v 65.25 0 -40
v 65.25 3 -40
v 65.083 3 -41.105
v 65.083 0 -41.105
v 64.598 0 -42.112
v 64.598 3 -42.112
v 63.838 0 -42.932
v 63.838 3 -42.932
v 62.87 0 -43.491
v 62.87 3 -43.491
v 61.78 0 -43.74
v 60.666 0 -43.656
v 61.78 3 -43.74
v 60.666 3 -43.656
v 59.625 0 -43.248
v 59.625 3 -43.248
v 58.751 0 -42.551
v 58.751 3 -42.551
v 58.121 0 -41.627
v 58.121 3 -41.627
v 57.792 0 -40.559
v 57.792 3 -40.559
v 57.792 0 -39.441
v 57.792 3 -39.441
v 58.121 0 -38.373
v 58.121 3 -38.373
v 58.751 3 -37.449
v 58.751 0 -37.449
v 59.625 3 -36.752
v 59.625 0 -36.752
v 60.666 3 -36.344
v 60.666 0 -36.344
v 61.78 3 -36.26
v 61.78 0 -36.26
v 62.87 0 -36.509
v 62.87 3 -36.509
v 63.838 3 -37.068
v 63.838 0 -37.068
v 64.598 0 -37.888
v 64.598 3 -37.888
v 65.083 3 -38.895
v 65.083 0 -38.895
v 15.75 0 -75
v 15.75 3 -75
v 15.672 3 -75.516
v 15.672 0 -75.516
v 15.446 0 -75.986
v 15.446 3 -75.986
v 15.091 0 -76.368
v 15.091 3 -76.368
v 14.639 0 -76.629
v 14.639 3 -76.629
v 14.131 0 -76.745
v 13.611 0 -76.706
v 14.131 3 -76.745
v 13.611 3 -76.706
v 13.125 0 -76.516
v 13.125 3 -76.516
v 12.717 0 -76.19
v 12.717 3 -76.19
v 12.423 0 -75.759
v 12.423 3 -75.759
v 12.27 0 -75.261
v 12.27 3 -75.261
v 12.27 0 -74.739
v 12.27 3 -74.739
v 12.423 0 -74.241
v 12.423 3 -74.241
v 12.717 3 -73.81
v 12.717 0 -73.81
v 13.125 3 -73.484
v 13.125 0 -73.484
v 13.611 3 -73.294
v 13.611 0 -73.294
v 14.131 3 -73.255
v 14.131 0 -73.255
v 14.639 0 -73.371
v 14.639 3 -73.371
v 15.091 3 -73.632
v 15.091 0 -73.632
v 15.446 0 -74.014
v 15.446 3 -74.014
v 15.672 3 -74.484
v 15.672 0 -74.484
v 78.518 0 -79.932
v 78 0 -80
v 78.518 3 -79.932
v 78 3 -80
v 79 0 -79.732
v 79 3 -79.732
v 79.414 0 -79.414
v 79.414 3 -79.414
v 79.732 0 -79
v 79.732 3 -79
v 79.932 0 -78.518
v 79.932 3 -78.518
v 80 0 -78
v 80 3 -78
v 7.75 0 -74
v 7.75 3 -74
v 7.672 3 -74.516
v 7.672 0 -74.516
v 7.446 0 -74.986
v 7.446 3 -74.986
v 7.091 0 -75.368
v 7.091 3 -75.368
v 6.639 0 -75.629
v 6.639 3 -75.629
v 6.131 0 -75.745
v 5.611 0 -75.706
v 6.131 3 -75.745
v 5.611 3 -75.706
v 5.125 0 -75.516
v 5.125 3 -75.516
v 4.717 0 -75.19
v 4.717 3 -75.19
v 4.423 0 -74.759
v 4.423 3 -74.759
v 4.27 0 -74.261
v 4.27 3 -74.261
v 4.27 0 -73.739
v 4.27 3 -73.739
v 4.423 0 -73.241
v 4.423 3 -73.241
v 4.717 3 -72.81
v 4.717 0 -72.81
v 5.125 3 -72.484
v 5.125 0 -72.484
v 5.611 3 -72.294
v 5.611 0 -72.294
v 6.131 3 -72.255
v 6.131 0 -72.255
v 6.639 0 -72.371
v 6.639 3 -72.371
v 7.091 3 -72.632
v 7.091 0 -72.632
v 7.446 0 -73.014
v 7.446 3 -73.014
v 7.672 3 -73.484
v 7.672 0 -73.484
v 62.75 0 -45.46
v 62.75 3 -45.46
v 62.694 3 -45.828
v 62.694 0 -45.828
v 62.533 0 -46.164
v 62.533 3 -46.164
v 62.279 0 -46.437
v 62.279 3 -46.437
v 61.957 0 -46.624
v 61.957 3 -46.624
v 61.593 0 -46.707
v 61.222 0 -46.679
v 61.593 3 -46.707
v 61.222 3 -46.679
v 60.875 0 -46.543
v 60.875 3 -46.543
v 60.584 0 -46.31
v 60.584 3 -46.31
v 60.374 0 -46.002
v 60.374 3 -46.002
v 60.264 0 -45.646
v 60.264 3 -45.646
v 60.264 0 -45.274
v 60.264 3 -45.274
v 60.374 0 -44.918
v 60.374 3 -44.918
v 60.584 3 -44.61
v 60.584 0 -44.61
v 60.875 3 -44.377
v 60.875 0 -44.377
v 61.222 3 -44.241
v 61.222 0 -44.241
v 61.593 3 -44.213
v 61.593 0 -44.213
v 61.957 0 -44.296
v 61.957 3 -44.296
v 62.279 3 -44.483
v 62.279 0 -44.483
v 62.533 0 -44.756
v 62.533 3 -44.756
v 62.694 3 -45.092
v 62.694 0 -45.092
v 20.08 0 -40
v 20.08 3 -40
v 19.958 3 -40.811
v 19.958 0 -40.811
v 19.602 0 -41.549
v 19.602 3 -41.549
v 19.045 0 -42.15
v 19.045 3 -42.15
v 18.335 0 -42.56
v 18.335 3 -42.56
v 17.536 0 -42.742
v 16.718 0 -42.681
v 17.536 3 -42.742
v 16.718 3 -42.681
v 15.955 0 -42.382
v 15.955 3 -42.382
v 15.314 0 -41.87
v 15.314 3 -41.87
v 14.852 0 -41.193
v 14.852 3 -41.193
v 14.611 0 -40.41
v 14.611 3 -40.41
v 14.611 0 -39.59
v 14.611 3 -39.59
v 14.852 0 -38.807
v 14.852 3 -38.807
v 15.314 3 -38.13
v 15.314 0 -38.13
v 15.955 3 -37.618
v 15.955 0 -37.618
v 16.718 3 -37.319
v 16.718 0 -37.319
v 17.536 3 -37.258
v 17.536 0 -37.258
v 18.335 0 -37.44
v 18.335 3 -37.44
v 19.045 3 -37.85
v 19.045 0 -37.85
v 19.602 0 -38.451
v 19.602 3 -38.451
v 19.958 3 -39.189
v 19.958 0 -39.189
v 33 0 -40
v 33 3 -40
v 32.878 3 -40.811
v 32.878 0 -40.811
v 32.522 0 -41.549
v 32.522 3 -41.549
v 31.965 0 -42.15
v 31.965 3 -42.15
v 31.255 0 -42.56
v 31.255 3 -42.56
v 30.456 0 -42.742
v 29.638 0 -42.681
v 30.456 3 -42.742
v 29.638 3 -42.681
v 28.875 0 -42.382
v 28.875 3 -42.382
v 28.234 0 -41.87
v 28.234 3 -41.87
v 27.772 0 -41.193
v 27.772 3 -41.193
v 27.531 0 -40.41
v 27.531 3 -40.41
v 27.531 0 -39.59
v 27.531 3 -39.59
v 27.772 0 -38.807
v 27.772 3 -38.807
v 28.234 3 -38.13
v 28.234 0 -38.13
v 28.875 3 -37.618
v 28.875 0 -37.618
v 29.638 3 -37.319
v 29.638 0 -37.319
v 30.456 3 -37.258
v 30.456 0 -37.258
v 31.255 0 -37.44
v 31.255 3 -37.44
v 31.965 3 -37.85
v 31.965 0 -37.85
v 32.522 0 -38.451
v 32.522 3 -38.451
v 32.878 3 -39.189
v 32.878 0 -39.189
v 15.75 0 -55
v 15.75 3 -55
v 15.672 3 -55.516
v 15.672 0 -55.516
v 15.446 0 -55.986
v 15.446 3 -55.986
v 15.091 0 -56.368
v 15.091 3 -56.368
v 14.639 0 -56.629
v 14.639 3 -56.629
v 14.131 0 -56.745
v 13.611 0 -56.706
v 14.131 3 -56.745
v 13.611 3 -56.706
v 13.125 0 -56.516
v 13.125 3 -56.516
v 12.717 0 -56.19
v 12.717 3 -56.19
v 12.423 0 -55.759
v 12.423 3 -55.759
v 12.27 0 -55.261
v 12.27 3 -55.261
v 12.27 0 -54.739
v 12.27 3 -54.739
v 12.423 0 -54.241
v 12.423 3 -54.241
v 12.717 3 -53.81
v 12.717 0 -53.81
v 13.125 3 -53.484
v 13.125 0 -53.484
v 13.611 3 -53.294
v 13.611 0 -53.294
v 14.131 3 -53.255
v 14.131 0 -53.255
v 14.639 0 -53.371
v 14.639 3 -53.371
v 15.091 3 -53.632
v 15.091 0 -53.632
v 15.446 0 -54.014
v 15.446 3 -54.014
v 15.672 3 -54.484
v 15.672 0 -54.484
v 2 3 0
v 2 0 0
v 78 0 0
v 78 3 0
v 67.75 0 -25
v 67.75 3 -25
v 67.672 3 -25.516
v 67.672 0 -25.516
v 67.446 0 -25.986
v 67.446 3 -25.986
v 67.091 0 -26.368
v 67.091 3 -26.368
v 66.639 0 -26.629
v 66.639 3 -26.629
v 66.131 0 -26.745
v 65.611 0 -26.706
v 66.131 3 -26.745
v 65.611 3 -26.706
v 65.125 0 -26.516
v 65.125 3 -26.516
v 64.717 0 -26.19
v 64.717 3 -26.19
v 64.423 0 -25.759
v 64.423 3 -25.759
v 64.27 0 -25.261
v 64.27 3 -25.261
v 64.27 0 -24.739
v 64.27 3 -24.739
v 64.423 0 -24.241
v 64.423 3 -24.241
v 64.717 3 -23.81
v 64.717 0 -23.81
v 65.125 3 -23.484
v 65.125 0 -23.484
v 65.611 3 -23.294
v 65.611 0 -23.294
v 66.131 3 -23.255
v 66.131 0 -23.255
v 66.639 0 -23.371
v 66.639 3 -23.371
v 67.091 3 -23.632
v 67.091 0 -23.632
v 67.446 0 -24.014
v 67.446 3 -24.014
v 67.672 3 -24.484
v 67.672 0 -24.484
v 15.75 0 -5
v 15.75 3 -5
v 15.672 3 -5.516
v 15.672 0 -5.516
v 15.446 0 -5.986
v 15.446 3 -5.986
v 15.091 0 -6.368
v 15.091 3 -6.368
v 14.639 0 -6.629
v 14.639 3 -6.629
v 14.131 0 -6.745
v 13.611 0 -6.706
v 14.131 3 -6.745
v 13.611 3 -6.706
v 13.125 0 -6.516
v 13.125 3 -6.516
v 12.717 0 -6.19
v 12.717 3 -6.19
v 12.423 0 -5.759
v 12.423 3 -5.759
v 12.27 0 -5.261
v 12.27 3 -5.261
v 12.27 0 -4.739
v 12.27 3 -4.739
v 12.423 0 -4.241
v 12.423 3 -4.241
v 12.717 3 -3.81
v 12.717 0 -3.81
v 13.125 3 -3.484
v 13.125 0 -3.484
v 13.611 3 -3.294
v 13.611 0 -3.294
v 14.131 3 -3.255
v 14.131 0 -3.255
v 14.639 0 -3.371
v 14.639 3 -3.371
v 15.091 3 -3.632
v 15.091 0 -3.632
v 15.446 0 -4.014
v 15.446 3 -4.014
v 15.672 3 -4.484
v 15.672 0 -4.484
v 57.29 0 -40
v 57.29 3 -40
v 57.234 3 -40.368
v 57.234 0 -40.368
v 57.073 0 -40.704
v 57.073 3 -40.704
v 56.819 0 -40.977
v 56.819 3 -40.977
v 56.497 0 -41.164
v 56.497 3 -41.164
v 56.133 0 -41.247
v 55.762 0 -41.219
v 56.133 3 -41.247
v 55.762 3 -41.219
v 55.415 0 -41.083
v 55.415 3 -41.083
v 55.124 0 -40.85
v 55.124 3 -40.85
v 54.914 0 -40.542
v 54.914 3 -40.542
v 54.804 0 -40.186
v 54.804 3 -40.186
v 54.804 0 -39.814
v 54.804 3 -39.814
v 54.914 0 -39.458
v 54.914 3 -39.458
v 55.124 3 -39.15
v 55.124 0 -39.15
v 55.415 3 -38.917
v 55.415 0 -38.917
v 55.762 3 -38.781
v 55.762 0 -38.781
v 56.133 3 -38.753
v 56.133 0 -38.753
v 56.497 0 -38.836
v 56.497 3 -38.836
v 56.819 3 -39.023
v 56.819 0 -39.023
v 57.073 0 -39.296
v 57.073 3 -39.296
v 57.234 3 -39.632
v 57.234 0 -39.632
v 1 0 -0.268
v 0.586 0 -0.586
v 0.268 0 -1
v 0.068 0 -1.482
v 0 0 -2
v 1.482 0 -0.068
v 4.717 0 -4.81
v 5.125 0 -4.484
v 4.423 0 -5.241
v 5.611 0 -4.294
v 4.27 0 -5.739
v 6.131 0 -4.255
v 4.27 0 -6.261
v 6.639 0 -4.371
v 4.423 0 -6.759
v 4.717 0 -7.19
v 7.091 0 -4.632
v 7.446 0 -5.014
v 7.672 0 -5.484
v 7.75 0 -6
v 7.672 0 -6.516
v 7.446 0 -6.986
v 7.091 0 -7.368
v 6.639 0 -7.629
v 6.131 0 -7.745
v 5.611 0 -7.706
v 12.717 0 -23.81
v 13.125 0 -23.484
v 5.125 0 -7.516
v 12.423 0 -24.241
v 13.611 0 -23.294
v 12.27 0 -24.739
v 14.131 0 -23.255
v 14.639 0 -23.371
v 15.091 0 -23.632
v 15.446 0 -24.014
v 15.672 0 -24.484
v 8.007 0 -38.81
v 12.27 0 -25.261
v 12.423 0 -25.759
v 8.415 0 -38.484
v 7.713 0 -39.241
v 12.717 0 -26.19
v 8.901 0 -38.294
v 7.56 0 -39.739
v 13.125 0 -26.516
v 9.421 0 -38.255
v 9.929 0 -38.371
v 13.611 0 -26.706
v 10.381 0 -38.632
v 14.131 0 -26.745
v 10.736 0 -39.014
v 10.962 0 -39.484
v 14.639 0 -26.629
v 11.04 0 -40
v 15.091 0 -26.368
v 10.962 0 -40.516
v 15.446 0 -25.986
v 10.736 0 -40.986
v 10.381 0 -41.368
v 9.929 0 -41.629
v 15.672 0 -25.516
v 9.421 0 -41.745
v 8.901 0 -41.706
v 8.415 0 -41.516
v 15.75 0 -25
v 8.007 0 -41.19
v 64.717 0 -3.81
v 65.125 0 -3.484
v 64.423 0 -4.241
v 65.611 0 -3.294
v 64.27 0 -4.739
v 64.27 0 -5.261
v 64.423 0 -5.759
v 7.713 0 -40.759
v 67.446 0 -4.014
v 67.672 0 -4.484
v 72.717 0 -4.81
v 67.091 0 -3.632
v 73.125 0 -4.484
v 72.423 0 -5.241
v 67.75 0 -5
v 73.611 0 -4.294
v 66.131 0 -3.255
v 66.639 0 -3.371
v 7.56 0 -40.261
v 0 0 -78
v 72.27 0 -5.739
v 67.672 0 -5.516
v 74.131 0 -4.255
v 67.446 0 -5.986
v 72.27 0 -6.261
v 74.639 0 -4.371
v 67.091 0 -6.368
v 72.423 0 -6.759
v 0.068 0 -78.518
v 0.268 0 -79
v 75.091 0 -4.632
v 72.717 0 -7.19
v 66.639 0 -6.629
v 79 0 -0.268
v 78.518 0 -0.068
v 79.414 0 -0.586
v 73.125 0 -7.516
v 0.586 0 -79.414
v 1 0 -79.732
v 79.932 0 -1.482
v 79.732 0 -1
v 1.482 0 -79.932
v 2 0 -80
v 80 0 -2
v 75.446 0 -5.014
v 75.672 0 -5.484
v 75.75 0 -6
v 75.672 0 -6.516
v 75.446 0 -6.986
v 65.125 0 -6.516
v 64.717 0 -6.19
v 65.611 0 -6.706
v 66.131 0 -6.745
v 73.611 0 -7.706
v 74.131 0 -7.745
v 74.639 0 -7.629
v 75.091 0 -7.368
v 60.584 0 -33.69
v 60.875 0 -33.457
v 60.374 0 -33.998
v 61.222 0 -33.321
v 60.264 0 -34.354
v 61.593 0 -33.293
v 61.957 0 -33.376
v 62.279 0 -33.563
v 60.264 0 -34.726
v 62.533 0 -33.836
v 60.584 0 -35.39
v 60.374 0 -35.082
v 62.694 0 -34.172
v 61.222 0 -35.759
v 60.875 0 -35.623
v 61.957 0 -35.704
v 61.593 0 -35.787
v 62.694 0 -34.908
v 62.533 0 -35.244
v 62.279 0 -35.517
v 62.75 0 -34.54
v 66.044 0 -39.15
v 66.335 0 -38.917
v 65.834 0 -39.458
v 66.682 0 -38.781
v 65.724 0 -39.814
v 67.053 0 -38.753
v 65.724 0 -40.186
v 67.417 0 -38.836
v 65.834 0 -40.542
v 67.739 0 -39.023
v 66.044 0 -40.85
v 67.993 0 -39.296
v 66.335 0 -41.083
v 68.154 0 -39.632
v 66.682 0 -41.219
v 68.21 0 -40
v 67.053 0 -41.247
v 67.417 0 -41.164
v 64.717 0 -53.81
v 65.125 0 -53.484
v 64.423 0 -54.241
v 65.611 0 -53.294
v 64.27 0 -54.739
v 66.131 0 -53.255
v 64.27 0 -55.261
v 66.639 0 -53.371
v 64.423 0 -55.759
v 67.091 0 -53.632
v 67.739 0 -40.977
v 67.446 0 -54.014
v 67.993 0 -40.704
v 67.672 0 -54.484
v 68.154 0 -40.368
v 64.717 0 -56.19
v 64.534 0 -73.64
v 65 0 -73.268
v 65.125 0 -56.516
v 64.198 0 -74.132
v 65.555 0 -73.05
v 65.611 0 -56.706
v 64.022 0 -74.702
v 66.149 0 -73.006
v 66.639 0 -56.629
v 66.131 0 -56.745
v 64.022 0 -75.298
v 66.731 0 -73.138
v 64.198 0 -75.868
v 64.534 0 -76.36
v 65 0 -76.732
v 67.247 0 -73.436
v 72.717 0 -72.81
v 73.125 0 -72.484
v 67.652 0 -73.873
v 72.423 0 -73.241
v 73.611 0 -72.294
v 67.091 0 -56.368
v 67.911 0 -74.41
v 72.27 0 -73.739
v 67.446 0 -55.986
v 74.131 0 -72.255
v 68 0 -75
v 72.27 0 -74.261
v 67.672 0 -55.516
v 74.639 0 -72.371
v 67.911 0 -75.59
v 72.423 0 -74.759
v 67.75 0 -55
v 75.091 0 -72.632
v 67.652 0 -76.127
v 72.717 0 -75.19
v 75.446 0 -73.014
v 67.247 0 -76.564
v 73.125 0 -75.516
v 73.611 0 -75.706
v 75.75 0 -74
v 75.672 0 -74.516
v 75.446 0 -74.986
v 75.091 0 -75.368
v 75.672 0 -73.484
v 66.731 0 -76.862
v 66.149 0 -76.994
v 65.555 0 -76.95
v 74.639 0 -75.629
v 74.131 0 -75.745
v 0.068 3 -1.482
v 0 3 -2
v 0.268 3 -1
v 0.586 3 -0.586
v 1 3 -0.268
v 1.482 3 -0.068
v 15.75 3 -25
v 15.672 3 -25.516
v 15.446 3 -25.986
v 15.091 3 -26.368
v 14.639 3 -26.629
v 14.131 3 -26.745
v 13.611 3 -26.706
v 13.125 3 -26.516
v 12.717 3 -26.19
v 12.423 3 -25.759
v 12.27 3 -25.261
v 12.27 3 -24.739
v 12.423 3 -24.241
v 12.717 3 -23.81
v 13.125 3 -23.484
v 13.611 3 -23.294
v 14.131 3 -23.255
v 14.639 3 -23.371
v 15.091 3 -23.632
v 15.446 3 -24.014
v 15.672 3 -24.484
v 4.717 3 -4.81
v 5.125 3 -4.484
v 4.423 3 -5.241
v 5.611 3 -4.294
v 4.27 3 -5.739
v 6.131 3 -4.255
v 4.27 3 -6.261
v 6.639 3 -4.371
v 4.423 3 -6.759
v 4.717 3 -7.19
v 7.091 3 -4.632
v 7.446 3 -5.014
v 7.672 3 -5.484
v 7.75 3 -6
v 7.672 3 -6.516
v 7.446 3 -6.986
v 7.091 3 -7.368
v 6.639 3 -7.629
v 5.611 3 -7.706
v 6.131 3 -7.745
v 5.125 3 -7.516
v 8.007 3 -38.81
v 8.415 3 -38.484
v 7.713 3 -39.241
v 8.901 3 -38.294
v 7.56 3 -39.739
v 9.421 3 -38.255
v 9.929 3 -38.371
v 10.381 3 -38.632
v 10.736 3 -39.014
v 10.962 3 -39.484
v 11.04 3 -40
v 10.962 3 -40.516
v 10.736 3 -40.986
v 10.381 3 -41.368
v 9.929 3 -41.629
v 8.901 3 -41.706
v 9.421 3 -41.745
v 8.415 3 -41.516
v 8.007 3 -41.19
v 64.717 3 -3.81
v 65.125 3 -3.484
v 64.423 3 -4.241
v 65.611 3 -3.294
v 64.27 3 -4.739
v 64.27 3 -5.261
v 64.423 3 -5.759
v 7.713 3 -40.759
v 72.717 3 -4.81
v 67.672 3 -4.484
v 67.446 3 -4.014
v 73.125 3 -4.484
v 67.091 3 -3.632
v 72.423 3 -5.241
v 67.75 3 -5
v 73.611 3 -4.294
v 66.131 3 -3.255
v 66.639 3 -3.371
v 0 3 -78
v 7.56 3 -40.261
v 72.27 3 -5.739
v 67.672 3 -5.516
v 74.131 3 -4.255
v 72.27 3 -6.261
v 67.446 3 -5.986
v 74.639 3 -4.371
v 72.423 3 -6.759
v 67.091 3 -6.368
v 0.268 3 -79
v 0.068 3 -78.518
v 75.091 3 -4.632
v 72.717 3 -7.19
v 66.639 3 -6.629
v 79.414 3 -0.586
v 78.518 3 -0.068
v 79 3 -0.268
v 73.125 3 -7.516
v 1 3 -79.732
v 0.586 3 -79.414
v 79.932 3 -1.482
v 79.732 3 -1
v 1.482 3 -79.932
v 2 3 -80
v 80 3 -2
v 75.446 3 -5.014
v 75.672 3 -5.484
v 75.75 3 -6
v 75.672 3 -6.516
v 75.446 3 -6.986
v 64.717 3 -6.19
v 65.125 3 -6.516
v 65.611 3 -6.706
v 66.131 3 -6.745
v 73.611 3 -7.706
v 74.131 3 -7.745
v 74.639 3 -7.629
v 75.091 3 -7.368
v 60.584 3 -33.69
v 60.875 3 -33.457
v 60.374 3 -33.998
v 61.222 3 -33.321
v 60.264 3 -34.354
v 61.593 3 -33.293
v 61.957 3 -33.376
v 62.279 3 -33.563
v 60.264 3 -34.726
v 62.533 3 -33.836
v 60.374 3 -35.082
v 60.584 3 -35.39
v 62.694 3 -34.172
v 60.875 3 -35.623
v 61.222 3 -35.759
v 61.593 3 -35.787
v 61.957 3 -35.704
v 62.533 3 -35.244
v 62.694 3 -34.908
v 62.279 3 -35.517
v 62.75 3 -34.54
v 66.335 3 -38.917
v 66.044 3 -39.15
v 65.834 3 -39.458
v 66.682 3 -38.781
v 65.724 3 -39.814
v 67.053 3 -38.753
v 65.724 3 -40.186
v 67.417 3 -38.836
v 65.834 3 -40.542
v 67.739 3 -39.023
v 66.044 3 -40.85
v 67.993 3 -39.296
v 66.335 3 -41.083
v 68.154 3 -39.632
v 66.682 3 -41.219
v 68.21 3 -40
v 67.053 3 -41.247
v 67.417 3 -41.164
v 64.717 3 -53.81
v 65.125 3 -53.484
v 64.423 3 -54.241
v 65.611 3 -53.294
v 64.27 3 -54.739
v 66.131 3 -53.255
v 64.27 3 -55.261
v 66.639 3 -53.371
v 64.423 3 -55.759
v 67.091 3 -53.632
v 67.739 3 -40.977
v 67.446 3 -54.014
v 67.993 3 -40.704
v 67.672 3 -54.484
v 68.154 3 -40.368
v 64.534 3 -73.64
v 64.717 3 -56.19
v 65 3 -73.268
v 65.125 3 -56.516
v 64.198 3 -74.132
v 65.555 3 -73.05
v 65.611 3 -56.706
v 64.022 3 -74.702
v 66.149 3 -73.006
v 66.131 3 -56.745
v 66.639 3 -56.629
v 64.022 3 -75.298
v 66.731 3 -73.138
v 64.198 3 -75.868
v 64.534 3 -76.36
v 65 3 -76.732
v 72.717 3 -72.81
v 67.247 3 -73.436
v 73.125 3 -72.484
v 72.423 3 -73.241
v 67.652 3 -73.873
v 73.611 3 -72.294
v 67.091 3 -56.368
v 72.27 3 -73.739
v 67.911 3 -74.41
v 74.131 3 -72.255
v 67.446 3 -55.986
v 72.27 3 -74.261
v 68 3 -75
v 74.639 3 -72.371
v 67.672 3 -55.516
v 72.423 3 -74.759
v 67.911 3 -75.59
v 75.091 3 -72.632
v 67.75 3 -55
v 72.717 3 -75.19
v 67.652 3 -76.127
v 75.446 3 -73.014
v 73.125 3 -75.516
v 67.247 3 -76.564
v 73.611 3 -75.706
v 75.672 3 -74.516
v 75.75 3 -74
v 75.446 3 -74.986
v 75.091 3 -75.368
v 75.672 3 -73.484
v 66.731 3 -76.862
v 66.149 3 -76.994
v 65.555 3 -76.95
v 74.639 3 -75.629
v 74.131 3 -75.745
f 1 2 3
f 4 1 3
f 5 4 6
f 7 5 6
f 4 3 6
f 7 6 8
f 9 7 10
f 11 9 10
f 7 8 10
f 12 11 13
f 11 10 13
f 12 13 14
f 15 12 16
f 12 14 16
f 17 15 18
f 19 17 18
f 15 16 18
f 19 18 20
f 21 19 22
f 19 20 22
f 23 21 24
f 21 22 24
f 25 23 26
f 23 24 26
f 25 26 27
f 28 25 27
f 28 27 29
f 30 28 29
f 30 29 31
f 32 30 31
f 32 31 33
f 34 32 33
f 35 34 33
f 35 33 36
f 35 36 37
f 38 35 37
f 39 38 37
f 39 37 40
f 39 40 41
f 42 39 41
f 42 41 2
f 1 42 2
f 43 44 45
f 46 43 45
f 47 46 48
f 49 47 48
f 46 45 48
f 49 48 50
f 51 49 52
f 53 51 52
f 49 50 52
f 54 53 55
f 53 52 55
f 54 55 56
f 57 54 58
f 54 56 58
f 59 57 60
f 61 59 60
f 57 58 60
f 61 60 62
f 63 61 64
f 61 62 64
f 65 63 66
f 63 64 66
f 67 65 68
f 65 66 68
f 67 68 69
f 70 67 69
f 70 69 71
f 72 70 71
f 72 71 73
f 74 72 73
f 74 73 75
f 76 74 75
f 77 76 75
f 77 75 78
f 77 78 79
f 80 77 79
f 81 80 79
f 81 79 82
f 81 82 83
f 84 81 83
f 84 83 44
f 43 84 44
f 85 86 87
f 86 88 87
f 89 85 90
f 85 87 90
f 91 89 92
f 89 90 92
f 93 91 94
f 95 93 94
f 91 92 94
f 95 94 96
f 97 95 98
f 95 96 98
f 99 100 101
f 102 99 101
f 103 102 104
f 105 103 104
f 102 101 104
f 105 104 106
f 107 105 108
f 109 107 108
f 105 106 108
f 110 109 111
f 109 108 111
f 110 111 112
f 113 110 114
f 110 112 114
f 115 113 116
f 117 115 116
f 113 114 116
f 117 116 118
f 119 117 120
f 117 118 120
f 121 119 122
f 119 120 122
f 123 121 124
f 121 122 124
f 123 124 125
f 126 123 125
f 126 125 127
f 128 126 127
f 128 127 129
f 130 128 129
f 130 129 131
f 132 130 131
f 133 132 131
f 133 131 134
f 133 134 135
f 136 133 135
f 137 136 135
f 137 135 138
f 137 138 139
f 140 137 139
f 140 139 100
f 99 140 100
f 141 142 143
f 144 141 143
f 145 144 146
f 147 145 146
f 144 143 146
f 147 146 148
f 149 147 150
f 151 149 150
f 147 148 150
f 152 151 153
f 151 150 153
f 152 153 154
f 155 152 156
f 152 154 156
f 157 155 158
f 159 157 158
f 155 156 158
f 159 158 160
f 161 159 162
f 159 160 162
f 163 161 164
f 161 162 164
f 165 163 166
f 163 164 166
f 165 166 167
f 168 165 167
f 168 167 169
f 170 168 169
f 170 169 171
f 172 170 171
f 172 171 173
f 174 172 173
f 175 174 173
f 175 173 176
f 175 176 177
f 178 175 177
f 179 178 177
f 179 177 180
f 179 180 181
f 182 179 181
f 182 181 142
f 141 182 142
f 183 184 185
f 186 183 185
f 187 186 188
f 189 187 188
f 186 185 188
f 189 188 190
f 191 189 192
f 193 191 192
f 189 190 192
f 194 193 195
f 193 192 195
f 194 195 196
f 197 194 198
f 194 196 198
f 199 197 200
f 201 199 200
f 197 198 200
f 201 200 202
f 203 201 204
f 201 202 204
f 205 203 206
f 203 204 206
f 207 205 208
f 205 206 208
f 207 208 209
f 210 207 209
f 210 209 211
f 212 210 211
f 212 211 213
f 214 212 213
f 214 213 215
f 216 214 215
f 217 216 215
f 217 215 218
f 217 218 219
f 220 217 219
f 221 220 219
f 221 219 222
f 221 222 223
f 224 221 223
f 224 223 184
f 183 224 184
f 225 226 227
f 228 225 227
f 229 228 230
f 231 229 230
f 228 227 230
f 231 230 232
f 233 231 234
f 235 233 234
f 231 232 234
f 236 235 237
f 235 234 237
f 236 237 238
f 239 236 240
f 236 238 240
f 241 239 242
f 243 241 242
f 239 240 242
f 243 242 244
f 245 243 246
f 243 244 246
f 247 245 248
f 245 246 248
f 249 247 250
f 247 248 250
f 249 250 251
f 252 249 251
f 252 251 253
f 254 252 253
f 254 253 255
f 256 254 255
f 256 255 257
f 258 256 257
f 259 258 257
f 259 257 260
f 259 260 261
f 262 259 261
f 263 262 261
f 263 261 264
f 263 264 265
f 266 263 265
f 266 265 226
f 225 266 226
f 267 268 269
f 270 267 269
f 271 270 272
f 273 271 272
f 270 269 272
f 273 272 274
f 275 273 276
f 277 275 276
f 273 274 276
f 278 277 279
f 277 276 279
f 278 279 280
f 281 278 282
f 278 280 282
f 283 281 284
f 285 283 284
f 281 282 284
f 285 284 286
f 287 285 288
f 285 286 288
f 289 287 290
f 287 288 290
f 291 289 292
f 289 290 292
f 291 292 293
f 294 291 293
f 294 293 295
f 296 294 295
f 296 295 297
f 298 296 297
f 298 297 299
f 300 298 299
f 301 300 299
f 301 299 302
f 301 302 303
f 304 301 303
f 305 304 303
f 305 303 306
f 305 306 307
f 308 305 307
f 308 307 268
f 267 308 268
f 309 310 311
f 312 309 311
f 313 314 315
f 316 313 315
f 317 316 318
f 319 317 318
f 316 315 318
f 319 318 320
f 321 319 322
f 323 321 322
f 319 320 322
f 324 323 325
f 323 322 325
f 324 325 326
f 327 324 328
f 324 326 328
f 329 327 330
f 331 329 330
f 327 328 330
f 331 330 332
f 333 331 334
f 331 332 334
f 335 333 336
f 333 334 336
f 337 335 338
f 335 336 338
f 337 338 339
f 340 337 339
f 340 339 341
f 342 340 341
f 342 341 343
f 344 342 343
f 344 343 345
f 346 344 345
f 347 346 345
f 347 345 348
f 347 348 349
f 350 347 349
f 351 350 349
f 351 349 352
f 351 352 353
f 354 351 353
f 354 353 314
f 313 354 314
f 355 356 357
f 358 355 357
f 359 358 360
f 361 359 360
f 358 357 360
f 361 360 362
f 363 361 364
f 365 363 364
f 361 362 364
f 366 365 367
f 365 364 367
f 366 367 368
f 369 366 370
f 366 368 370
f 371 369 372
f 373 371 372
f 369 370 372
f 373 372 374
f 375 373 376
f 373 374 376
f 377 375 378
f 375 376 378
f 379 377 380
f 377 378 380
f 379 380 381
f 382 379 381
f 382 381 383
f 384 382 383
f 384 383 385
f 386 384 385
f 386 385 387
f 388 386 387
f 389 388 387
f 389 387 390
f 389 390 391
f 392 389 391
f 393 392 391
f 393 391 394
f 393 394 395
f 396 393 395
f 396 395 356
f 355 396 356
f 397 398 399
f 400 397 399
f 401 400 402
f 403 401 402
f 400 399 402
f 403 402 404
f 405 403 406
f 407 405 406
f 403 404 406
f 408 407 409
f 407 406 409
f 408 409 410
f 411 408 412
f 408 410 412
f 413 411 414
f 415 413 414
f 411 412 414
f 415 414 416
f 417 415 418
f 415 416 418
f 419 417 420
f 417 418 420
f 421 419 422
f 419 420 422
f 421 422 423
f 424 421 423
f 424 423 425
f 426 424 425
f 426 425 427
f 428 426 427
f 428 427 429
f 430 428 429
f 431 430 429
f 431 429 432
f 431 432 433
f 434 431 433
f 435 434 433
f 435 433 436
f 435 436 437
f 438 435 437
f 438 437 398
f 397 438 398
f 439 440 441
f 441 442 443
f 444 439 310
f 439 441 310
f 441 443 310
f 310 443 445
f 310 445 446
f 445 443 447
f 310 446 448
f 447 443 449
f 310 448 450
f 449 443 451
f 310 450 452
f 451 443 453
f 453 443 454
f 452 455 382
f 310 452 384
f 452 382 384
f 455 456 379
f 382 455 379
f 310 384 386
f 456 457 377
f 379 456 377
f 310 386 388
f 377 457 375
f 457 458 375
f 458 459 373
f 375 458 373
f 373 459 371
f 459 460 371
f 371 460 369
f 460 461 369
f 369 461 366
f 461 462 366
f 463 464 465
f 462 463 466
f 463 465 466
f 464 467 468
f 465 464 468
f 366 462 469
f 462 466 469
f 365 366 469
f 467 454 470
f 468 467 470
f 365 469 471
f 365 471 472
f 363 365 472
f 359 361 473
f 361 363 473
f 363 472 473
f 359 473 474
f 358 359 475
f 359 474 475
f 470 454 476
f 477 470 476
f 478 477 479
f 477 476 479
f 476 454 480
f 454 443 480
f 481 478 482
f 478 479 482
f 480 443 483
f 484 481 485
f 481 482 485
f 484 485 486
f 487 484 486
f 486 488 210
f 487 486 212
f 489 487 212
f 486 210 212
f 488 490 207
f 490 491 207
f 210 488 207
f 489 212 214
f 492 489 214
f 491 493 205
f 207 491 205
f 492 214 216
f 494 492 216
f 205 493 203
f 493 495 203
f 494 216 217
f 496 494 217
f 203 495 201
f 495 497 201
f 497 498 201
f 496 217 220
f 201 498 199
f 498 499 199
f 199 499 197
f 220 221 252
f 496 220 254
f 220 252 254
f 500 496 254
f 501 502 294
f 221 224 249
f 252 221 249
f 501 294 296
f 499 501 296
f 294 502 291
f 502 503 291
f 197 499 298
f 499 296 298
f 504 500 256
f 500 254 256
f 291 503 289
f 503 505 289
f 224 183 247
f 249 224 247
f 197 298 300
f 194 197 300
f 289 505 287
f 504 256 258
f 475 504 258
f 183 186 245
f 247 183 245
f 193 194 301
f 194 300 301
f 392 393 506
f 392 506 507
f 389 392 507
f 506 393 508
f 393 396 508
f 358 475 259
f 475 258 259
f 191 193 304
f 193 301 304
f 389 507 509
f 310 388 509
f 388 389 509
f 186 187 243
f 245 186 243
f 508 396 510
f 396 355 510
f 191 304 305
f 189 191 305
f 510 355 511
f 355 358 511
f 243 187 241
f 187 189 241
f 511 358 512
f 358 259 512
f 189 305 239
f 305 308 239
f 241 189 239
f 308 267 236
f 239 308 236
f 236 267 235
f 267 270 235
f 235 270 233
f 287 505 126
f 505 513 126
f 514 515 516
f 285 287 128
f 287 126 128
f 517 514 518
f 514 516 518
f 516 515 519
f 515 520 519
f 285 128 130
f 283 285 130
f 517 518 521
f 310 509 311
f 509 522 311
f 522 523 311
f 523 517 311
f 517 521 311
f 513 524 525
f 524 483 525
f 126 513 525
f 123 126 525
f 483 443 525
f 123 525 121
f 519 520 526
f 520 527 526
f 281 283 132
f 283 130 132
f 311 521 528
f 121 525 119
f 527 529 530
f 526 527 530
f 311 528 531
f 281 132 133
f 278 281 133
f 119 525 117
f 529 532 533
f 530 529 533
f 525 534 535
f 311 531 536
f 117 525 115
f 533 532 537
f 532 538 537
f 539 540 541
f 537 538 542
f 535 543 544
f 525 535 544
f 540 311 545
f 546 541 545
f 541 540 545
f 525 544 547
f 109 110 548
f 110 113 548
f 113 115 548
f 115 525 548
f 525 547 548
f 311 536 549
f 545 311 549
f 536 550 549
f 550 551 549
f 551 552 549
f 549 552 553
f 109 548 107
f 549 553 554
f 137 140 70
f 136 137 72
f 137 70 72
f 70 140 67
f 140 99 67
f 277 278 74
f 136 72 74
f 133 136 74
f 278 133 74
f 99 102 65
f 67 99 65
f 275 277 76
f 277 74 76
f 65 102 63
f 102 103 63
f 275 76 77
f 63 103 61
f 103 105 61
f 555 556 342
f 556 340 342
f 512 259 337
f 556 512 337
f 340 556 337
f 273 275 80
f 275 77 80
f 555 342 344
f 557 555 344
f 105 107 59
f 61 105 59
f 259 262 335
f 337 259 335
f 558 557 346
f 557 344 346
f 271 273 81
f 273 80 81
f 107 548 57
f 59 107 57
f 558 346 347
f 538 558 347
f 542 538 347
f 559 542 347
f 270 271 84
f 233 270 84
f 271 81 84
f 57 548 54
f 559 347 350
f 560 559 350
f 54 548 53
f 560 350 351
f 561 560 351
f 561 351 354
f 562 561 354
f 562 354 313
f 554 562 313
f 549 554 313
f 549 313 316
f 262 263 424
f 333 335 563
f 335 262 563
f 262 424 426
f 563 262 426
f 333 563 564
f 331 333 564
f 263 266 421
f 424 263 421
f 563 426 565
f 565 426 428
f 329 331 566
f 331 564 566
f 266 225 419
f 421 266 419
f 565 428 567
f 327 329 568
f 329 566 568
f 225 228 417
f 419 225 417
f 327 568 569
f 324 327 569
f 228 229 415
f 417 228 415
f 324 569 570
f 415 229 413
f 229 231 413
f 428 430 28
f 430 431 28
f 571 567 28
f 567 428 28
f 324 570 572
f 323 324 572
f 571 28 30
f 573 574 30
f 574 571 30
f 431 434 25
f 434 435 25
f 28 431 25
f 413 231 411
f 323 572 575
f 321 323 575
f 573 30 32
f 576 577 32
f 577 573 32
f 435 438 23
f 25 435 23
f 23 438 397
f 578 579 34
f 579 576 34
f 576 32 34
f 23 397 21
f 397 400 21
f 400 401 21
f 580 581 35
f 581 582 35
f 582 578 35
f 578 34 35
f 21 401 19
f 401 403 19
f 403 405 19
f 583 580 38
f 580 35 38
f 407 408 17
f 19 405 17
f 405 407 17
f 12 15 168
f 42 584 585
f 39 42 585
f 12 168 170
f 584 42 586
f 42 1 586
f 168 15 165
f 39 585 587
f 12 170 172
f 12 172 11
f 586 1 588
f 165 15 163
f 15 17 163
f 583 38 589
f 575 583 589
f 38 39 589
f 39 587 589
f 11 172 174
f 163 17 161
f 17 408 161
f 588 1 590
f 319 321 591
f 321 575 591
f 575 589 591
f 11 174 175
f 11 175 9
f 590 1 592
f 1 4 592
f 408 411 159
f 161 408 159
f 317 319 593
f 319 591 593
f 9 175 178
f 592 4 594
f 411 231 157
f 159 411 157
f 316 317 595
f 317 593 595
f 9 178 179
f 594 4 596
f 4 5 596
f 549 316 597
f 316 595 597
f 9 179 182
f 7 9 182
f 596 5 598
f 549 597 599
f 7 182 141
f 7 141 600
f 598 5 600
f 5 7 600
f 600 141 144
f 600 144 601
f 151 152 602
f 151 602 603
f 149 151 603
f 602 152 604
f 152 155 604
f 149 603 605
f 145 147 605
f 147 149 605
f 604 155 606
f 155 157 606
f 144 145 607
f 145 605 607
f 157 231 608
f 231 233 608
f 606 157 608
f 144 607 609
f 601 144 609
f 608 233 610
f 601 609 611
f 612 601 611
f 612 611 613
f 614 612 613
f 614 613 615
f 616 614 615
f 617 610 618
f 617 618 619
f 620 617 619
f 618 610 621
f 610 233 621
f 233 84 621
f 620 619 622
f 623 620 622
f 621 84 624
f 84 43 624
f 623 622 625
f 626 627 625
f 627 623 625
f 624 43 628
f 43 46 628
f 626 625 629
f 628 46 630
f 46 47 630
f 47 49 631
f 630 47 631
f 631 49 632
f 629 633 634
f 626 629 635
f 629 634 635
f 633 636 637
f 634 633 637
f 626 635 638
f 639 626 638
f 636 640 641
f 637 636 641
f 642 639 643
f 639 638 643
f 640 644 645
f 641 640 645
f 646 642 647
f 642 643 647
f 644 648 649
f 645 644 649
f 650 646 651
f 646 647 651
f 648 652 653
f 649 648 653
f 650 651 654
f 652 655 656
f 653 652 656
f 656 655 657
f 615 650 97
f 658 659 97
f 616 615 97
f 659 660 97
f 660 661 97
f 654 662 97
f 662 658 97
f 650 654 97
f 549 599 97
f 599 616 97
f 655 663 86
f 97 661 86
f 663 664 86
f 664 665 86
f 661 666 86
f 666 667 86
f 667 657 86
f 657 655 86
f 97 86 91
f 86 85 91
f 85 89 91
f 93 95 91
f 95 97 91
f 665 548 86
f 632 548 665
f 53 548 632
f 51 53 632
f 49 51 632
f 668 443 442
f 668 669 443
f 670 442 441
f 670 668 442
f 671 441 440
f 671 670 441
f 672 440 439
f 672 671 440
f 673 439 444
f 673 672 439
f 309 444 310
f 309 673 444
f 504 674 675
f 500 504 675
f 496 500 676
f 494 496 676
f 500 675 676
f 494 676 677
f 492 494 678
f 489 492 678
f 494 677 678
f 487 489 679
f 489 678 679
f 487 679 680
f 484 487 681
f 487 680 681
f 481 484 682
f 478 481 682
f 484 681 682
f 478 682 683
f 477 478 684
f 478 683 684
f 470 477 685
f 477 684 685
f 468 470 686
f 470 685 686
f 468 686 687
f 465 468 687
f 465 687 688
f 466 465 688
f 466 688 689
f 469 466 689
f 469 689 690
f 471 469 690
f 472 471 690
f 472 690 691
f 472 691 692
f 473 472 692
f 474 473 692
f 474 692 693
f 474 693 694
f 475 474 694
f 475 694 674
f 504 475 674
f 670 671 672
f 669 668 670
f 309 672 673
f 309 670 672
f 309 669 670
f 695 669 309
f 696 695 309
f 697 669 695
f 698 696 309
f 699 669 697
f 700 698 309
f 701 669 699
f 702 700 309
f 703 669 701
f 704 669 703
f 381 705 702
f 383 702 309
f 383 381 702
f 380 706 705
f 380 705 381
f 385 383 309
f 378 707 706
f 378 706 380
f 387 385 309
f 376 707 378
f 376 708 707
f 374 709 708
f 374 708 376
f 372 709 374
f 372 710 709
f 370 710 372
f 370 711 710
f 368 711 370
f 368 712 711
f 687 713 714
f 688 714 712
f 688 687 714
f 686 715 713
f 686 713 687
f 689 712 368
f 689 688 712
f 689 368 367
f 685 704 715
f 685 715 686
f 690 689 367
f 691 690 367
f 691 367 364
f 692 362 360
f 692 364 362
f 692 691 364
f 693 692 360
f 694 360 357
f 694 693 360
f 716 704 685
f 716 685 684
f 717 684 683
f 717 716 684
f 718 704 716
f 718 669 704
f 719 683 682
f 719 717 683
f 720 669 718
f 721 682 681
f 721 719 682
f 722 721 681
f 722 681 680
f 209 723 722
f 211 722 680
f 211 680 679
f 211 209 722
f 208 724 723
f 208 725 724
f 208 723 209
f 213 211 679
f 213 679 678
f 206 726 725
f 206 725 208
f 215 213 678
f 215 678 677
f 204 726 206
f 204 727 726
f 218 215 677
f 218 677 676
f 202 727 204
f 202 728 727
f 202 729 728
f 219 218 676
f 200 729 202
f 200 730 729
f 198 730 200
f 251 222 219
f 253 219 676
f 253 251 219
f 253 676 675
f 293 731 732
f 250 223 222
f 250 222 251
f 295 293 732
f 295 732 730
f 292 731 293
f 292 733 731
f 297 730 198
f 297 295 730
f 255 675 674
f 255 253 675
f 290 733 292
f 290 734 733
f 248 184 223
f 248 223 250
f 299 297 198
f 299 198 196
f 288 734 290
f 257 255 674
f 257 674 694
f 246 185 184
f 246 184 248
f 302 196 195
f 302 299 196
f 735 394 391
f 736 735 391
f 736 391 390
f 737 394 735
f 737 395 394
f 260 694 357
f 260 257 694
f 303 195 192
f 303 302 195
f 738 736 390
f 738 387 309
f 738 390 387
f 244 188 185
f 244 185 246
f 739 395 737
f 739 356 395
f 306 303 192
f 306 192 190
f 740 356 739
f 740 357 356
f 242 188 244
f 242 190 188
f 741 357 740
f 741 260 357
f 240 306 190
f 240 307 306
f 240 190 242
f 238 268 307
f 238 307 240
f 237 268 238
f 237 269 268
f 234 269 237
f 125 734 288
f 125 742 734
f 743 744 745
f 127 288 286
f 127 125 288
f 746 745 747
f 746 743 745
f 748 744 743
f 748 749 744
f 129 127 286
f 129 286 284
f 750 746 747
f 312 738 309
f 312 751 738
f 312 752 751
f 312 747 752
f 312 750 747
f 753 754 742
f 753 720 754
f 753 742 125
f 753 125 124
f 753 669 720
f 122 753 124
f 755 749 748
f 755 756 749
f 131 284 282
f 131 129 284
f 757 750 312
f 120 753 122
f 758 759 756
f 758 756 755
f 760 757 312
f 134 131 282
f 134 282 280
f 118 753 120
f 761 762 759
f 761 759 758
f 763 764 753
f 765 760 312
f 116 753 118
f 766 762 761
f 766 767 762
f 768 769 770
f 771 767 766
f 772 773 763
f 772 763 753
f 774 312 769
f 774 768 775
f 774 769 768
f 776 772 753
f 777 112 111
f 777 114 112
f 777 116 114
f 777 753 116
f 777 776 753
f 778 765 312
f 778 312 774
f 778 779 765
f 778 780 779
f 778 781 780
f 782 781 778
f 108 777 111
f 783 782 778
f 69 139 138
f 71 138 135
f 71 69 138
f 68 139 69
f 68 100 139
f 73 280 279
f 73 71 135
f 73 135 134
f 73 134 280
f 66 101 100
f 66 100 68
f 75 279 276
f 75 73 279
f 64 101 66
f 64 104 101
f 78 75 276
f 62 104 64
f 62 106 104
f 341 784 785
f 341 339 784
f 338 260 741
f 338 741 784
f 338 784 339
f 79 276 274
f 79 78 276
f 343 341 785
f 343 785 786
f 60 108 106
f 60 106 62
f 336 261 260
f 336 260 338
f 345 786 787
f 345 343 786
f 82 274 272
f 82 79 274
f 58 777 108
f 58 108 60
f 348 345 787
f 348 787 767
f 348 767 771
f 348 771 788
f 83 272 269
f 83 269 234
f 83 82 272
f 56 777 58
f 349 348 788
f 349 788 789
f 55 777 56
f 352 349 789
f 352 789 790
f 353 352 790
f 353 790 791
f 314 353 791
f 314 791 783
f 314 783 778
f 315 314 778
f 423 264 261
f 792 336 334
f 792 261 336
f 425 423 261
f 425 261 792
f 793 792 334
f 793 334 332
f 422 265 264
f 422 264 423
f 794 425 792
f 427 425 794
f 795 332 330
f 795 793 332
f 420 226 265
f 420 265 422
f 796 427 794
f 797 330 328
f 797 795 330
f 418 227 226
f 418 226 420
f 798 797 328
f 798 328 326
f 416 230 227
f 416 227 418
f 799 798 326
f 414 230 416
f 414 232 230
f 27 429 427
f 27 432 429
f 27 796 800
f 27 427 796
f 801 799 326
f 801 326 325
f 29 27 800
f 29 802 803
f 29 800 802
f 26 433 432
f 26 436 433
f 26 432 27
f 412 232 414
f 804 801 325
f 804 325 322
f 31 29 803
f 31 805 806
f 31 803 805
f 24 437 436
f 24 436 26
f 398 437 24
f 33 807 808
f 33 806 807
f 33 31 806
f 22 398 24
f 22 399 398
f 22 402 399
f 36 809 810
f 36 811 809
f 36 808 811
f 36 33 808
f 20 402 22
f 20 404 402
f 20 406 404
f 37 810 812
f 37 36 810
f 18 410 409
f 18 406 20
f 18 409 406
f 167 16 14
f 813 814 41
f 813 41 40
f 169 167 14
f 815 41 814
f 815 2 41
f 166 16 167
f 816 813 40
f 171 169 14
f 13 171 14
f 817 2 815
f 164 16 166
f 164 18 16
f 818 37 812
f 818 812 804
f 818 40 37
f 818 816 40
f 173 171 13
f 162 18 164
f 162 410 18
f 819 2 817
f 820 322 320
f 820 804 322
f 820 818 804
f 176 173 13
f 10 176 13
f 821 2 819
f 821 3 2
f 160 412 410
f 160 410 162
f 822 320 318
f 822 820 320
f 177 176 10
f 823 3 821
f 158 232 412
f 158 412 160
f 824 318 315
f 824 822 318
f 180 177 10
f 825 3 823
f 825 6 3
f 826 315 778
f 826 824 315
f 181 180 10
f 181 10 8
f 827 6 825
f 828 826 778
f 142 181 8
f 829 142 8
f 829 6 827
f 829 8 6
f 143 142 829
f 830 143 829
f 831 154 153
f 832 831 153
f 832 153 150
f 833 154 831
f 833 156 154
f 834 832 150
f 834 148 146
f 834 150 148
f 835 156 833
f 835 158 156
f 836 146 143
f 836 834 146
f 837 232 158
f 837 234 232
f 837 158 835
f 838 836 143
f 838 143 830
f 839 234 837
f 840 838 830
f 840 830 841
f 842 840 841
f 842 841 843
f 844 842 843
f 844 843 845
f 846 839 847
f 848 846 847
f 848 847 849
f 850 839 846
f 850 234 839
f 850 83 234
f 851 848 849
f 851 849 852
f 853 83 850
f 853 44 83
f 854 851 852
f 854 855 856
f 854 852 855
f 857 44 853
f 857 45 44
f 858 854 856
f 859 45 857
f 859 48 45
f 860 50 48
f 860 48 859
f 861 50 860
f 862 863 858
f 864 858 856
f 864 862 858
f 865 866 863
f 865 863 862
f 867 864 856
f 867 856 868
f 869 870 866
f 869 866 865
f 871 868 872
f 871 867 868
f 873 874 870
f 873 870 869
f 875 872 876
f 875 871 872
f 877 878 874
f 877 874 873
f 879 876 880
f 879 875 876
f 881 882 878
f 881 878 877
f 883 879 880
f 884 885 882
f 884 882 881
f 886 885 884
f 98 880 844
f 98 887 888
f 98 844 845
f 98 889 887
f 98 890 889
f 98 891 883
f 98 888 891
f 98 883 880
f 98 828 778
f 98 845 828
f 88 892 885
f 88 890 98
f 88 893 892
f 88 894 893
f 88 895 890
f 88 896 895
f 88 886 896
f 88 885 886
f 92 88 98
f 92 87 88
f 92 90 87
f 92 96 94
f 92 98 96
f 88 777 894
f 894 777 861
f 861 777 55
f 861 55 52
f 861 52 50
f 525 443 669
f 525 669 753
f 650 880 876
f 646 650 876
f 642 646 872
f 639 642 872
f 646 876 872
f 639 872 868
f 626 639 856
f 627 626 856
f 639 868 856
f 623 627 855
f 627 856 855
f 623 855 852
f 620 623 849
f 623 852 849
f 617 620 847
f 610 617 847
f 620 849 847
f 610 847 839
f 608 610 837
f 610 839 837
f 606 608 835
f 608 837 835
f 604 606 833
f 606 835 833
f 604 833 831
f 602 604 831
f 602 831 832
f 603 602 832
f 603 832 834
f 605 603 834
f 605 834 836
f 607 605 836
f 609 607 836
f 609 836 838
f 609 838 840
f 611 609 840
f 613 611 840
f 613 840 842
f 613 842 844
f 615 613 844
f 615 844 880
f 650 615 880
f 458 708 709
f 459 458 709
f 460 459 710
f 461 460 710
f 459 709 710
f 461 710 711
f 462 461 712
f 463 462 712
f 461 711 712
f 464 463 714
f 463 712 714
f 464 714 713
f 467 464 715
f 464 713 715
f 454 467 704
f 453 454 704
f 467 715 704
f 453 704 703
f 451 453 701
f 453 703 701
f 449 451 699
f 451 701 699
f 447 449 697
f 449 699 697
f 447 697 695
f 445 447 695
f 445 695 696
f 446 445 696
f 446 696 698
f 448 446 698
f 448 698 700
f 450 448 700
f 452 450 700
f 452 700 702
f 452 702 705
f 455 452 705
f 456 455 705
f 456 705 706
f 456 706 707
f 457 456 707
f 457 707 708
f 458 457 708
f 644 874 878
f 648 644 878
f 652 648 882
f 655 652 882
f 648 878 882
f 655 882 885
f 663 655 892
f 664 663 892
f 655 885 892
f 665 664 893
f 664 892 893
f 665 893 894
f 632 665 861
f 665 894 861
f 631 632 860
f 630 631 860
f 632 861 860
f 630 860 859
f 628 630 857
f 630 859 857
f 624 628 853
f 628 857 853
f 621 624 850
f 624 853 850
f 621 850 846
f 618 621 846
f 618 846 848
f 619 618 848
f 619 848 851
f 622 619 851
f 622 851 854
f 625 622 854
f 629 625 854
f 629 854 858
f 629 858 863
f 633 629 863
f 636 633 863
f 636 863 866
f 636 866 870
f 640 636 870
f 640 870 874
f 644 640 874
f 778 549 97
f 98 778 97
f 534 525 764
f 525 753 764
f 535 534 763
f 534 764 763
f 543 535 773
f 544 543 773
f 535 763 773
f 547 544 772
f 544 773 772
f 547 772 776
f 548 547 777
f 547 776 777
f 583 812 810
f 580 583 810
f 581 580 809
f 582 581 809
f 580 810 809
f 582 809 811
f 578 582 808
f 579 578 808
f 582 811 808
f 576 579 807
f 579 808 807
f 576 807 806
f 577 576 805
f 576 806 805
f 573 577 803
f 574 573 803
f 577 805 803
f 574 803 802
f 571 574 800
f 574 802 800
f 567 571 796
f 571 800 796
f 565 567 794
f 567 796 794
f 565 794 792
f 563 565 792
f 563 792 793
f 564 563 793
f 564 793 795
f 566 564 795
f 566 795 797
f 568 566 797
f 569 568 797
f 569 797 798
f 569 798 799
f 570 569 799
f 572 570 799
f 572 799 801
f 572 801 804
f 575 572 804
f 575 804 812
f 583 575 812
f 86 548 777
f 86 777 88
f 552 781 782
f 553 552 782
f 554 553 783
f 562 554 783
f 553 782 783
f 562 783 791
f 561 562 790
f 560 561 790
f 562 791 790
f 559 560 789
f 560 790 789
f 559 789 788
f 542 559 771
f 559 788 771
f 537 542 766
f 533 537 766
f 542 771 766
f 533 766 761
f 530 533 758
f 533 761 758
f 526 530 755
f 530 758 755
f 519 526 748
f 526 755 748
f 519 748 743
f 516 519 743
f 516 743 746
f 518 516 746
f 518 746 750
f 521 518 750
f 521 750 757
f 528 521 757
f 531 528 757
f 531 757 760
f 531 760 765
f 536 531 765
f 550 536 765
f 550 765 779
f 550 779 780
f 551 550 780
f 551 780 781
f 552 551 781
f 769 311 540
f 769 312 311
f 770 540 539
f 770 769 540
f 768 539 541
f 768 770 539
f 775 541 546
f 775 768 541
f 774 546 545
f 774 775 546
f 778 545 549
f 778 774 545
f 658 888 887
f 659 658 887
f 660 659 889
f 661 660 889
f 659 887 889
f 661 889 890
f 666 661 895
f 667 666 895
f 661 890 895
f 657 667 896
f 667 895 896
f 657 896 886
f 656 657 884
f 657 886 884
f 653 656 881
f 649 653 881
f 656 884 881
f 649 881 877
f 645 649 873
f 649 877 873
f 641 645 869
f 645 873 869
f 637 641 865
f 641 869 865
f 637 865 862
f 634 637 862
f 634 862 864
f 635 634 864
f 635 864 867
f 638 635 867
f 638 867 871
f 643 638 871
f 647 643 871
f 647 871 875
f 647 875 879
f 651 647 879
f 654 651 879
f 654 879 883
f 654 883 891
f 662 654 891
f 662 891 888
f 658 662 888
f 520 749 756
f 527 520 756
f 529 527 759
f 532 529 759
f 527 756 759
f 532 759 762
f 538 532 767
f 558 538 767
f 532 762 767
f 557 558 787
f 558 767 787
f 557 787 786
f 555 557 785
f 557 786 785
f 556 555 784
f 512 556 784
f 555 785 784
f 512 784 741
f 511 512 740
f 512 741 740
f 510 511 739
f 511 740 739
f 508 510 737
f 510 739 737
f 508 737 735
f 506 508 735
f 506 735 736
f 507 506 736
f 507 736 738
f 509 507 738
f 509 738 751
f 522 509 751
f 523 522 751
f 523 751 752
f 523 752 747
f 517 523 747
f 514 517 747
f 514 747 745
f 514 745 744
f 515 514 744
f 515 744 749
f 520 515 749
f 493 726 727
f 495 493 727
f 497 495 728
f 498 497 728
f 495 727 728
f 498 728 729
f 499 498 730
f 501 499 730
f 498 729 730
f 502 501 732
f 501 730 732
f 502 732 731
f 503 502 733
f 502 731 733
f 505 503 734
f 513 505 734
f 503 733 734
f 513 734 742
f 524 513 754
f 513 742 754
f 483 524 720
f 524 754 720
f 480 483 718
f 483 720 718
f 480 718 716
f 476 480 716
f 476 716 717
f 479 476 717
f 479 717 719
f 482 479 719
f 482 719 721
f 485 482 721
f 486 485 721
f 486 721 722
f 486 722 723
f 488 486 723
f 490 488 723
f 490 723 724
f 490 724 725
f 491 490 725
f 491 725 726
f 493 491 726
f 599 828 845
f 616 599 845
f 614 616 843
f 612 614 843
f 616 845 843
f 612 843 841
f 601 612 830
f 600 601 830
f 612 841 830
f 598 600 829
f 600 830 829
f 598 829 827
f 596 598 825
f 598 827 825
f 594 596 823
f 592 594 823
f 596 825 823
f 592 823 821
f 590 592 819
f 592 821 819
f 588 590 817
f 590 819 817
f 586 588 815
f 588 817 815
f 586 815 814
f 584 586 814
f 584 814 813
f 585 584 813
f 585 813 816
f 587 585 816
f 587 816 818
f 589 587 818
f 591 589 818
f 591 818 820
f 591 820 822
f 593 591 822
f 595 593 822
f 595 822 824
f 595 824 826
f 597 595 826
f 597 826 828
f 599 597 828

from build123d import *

# Parameters (mm, degrees)
SKETCH1_W           = 80
SKETCH1_H           = 80
BOSS_EXTRUDE1_DEPTH = 3
SKETCH2_R           = 1.75
SKETCH2_R_2         = 2.75
CUT_EXTRUDE1_DEPTH  = 4
SKETCH3_R           = 3.75
CUT_EXTRUDE2_DEPTH  = 4
SKETCH4_R           = 1.25
CUT_EXTRUDE3_DEPTH  = 4
SKETCH5_R           = 2.75
CUT_EXTRUDE4_DEPTH  = 4
SKETCH6_R           = 1.75
CUT_EXTRUDE5_DEPTH  = 4
FILLET1_R           = 2
SKETCH7_R           = 1.75
SKETCH7_R_2         = 2
CUT_EXTRUDE6_DEPTH  = 4


with BuildPart() as part:
    # Sketch1 → Boss-Extrude1 (new body)
    with BuildSketch(Plane(origin=(0, 0, 0), x_dir=(1, 0, 0), z_dir=(0, 1, 0))):
        with Locations((40, 40)):
            Rectangle(SKETCH1_W, SKETCH1_H)
    extrude(amount=BOSS_EXTRUDE1_DEPTH)

    # Sketch2 → Cut-Extrude1 (cut, through all)
    with BuildSketch(Plane(origin=(0, 3, 0), x_dir=(1, 0, 0), z_dir=(0, 1, 0))):
        with Locations((9.29, 40)):
            Circle(SKETCH2_R)
        with Locations((17.33, 40)):
            Circle(SKETCH2_R_2)
    extrude(amount=-CUT_EXTRUDE1_DEPTH, mode=Mode.SUBTRACT)

    # Sketch3 → Cut-Extrude2 (cut, through all)
    with BuildSketch(Plane(origin=(0, 3, 0), x_dir=(1, 0, 0), z_dir=(0, 1, 0))):
        with Locations((61.5, 40)):
            Circle(SKETCH3_R)
    extrude(amount=-CUT_EXTRUDE2_DEPTH, mode=Mode.SUBTRACT)

    # Sketch4 → Cut-Extrude3 (cut, through all)
    with BuildSketch(Plane(origin=(0, 3, 0), x_dir=(1, 0, 0), z_dir=(0, 1, 0))):
        with Locations((66.96, 40)):
            Circle(SKETCH4_R)
        with Locations((56.04, 40)):
            Circle(SKETCH4_R)
        with Locations((61.5, 34.54)):
            Circle(SKETCH4_R)
        with Locations((61.5, 45.46)):
            Circle(SKETCH4_R)
    extrude(amount=-CUT_EXTRUDE3_DEPTH, mode=Mode.SUBTRACT)

    # Sketch5 → Cut-Extrude4 (cut, through all)
    with BuildSketch(Plane(origin=(0, 3, 0), x_dir=(1, 0, 0), z_dir=(0, 1, 0))):
        with Locations((30.25, 40)):
            Circle(SKETCH5_R)
    extrude(amount=-CUT_EXTRUDE4_DEPTH, mode=Mode.SUBTRACT)

    # Sketch6 → Cut-Extrude5 (cut, through all)
    with BuildSketch(Plane(origin=(0, 3, 0), x_dir=(1, 0, 0), z_dir=(0, 1, 0))):
        with Locations((6, 74)):
            Circle(SKETCH6_R)
        with Locations((74, 74)):
            Circle(SKETCH6_R)
        with Locations((74, 6)):
            Circle(SKETCH6_R)
        with Locations((6, 6)):
            Circle(SKETCH6_R)
    extrude(amount=-CUT_EXTRUDE5_DEPTH, mode=Mode.SUBTRACT)

    # Fillet1
    fillet1_edges = [part.edges().sort_by_distance(p)[0] for p in [
        (0, 1.5, -80),
        (80, 1.5, -80),
        (80, 1.5, 0),
        (0, 1.5, 0),
    ]]
    fillet(fillet1_edges, radius=FILLET1_R)

    # Sketch7 → Cut-Extrude6 (cut, through all)
    with BuildSketch(Plane(origin=(0, 3, 0), x_dir=(1, 0, 0), z_dir=(0, 1, 0))):
        with Locations((14, 5)):
            Circle(SKETCH7_R)
        with Locations((66, 5)):
            Circle(SKETCH7_R)
        with Locations((66, 25)):
            Circle(SKETCH7_R)
        with Locations((14, 25)):
            Circle(SKETCH7_R)
        with Locations((14, 75)):
            Circle(SKETCH7_R)
        with Locations((14, 55)):
            Circle(SKETCH7_R)
        with Locations((66, 75)):
            Circle(SKETCH7_R_2)
        with Locations((66, 55)):
            Circle(SKETCH7_R)
    extrude(amount=-CUT_EXTRUDE6_DEPTH, mode=Mode.SUBTRACT)


solid = part.part
